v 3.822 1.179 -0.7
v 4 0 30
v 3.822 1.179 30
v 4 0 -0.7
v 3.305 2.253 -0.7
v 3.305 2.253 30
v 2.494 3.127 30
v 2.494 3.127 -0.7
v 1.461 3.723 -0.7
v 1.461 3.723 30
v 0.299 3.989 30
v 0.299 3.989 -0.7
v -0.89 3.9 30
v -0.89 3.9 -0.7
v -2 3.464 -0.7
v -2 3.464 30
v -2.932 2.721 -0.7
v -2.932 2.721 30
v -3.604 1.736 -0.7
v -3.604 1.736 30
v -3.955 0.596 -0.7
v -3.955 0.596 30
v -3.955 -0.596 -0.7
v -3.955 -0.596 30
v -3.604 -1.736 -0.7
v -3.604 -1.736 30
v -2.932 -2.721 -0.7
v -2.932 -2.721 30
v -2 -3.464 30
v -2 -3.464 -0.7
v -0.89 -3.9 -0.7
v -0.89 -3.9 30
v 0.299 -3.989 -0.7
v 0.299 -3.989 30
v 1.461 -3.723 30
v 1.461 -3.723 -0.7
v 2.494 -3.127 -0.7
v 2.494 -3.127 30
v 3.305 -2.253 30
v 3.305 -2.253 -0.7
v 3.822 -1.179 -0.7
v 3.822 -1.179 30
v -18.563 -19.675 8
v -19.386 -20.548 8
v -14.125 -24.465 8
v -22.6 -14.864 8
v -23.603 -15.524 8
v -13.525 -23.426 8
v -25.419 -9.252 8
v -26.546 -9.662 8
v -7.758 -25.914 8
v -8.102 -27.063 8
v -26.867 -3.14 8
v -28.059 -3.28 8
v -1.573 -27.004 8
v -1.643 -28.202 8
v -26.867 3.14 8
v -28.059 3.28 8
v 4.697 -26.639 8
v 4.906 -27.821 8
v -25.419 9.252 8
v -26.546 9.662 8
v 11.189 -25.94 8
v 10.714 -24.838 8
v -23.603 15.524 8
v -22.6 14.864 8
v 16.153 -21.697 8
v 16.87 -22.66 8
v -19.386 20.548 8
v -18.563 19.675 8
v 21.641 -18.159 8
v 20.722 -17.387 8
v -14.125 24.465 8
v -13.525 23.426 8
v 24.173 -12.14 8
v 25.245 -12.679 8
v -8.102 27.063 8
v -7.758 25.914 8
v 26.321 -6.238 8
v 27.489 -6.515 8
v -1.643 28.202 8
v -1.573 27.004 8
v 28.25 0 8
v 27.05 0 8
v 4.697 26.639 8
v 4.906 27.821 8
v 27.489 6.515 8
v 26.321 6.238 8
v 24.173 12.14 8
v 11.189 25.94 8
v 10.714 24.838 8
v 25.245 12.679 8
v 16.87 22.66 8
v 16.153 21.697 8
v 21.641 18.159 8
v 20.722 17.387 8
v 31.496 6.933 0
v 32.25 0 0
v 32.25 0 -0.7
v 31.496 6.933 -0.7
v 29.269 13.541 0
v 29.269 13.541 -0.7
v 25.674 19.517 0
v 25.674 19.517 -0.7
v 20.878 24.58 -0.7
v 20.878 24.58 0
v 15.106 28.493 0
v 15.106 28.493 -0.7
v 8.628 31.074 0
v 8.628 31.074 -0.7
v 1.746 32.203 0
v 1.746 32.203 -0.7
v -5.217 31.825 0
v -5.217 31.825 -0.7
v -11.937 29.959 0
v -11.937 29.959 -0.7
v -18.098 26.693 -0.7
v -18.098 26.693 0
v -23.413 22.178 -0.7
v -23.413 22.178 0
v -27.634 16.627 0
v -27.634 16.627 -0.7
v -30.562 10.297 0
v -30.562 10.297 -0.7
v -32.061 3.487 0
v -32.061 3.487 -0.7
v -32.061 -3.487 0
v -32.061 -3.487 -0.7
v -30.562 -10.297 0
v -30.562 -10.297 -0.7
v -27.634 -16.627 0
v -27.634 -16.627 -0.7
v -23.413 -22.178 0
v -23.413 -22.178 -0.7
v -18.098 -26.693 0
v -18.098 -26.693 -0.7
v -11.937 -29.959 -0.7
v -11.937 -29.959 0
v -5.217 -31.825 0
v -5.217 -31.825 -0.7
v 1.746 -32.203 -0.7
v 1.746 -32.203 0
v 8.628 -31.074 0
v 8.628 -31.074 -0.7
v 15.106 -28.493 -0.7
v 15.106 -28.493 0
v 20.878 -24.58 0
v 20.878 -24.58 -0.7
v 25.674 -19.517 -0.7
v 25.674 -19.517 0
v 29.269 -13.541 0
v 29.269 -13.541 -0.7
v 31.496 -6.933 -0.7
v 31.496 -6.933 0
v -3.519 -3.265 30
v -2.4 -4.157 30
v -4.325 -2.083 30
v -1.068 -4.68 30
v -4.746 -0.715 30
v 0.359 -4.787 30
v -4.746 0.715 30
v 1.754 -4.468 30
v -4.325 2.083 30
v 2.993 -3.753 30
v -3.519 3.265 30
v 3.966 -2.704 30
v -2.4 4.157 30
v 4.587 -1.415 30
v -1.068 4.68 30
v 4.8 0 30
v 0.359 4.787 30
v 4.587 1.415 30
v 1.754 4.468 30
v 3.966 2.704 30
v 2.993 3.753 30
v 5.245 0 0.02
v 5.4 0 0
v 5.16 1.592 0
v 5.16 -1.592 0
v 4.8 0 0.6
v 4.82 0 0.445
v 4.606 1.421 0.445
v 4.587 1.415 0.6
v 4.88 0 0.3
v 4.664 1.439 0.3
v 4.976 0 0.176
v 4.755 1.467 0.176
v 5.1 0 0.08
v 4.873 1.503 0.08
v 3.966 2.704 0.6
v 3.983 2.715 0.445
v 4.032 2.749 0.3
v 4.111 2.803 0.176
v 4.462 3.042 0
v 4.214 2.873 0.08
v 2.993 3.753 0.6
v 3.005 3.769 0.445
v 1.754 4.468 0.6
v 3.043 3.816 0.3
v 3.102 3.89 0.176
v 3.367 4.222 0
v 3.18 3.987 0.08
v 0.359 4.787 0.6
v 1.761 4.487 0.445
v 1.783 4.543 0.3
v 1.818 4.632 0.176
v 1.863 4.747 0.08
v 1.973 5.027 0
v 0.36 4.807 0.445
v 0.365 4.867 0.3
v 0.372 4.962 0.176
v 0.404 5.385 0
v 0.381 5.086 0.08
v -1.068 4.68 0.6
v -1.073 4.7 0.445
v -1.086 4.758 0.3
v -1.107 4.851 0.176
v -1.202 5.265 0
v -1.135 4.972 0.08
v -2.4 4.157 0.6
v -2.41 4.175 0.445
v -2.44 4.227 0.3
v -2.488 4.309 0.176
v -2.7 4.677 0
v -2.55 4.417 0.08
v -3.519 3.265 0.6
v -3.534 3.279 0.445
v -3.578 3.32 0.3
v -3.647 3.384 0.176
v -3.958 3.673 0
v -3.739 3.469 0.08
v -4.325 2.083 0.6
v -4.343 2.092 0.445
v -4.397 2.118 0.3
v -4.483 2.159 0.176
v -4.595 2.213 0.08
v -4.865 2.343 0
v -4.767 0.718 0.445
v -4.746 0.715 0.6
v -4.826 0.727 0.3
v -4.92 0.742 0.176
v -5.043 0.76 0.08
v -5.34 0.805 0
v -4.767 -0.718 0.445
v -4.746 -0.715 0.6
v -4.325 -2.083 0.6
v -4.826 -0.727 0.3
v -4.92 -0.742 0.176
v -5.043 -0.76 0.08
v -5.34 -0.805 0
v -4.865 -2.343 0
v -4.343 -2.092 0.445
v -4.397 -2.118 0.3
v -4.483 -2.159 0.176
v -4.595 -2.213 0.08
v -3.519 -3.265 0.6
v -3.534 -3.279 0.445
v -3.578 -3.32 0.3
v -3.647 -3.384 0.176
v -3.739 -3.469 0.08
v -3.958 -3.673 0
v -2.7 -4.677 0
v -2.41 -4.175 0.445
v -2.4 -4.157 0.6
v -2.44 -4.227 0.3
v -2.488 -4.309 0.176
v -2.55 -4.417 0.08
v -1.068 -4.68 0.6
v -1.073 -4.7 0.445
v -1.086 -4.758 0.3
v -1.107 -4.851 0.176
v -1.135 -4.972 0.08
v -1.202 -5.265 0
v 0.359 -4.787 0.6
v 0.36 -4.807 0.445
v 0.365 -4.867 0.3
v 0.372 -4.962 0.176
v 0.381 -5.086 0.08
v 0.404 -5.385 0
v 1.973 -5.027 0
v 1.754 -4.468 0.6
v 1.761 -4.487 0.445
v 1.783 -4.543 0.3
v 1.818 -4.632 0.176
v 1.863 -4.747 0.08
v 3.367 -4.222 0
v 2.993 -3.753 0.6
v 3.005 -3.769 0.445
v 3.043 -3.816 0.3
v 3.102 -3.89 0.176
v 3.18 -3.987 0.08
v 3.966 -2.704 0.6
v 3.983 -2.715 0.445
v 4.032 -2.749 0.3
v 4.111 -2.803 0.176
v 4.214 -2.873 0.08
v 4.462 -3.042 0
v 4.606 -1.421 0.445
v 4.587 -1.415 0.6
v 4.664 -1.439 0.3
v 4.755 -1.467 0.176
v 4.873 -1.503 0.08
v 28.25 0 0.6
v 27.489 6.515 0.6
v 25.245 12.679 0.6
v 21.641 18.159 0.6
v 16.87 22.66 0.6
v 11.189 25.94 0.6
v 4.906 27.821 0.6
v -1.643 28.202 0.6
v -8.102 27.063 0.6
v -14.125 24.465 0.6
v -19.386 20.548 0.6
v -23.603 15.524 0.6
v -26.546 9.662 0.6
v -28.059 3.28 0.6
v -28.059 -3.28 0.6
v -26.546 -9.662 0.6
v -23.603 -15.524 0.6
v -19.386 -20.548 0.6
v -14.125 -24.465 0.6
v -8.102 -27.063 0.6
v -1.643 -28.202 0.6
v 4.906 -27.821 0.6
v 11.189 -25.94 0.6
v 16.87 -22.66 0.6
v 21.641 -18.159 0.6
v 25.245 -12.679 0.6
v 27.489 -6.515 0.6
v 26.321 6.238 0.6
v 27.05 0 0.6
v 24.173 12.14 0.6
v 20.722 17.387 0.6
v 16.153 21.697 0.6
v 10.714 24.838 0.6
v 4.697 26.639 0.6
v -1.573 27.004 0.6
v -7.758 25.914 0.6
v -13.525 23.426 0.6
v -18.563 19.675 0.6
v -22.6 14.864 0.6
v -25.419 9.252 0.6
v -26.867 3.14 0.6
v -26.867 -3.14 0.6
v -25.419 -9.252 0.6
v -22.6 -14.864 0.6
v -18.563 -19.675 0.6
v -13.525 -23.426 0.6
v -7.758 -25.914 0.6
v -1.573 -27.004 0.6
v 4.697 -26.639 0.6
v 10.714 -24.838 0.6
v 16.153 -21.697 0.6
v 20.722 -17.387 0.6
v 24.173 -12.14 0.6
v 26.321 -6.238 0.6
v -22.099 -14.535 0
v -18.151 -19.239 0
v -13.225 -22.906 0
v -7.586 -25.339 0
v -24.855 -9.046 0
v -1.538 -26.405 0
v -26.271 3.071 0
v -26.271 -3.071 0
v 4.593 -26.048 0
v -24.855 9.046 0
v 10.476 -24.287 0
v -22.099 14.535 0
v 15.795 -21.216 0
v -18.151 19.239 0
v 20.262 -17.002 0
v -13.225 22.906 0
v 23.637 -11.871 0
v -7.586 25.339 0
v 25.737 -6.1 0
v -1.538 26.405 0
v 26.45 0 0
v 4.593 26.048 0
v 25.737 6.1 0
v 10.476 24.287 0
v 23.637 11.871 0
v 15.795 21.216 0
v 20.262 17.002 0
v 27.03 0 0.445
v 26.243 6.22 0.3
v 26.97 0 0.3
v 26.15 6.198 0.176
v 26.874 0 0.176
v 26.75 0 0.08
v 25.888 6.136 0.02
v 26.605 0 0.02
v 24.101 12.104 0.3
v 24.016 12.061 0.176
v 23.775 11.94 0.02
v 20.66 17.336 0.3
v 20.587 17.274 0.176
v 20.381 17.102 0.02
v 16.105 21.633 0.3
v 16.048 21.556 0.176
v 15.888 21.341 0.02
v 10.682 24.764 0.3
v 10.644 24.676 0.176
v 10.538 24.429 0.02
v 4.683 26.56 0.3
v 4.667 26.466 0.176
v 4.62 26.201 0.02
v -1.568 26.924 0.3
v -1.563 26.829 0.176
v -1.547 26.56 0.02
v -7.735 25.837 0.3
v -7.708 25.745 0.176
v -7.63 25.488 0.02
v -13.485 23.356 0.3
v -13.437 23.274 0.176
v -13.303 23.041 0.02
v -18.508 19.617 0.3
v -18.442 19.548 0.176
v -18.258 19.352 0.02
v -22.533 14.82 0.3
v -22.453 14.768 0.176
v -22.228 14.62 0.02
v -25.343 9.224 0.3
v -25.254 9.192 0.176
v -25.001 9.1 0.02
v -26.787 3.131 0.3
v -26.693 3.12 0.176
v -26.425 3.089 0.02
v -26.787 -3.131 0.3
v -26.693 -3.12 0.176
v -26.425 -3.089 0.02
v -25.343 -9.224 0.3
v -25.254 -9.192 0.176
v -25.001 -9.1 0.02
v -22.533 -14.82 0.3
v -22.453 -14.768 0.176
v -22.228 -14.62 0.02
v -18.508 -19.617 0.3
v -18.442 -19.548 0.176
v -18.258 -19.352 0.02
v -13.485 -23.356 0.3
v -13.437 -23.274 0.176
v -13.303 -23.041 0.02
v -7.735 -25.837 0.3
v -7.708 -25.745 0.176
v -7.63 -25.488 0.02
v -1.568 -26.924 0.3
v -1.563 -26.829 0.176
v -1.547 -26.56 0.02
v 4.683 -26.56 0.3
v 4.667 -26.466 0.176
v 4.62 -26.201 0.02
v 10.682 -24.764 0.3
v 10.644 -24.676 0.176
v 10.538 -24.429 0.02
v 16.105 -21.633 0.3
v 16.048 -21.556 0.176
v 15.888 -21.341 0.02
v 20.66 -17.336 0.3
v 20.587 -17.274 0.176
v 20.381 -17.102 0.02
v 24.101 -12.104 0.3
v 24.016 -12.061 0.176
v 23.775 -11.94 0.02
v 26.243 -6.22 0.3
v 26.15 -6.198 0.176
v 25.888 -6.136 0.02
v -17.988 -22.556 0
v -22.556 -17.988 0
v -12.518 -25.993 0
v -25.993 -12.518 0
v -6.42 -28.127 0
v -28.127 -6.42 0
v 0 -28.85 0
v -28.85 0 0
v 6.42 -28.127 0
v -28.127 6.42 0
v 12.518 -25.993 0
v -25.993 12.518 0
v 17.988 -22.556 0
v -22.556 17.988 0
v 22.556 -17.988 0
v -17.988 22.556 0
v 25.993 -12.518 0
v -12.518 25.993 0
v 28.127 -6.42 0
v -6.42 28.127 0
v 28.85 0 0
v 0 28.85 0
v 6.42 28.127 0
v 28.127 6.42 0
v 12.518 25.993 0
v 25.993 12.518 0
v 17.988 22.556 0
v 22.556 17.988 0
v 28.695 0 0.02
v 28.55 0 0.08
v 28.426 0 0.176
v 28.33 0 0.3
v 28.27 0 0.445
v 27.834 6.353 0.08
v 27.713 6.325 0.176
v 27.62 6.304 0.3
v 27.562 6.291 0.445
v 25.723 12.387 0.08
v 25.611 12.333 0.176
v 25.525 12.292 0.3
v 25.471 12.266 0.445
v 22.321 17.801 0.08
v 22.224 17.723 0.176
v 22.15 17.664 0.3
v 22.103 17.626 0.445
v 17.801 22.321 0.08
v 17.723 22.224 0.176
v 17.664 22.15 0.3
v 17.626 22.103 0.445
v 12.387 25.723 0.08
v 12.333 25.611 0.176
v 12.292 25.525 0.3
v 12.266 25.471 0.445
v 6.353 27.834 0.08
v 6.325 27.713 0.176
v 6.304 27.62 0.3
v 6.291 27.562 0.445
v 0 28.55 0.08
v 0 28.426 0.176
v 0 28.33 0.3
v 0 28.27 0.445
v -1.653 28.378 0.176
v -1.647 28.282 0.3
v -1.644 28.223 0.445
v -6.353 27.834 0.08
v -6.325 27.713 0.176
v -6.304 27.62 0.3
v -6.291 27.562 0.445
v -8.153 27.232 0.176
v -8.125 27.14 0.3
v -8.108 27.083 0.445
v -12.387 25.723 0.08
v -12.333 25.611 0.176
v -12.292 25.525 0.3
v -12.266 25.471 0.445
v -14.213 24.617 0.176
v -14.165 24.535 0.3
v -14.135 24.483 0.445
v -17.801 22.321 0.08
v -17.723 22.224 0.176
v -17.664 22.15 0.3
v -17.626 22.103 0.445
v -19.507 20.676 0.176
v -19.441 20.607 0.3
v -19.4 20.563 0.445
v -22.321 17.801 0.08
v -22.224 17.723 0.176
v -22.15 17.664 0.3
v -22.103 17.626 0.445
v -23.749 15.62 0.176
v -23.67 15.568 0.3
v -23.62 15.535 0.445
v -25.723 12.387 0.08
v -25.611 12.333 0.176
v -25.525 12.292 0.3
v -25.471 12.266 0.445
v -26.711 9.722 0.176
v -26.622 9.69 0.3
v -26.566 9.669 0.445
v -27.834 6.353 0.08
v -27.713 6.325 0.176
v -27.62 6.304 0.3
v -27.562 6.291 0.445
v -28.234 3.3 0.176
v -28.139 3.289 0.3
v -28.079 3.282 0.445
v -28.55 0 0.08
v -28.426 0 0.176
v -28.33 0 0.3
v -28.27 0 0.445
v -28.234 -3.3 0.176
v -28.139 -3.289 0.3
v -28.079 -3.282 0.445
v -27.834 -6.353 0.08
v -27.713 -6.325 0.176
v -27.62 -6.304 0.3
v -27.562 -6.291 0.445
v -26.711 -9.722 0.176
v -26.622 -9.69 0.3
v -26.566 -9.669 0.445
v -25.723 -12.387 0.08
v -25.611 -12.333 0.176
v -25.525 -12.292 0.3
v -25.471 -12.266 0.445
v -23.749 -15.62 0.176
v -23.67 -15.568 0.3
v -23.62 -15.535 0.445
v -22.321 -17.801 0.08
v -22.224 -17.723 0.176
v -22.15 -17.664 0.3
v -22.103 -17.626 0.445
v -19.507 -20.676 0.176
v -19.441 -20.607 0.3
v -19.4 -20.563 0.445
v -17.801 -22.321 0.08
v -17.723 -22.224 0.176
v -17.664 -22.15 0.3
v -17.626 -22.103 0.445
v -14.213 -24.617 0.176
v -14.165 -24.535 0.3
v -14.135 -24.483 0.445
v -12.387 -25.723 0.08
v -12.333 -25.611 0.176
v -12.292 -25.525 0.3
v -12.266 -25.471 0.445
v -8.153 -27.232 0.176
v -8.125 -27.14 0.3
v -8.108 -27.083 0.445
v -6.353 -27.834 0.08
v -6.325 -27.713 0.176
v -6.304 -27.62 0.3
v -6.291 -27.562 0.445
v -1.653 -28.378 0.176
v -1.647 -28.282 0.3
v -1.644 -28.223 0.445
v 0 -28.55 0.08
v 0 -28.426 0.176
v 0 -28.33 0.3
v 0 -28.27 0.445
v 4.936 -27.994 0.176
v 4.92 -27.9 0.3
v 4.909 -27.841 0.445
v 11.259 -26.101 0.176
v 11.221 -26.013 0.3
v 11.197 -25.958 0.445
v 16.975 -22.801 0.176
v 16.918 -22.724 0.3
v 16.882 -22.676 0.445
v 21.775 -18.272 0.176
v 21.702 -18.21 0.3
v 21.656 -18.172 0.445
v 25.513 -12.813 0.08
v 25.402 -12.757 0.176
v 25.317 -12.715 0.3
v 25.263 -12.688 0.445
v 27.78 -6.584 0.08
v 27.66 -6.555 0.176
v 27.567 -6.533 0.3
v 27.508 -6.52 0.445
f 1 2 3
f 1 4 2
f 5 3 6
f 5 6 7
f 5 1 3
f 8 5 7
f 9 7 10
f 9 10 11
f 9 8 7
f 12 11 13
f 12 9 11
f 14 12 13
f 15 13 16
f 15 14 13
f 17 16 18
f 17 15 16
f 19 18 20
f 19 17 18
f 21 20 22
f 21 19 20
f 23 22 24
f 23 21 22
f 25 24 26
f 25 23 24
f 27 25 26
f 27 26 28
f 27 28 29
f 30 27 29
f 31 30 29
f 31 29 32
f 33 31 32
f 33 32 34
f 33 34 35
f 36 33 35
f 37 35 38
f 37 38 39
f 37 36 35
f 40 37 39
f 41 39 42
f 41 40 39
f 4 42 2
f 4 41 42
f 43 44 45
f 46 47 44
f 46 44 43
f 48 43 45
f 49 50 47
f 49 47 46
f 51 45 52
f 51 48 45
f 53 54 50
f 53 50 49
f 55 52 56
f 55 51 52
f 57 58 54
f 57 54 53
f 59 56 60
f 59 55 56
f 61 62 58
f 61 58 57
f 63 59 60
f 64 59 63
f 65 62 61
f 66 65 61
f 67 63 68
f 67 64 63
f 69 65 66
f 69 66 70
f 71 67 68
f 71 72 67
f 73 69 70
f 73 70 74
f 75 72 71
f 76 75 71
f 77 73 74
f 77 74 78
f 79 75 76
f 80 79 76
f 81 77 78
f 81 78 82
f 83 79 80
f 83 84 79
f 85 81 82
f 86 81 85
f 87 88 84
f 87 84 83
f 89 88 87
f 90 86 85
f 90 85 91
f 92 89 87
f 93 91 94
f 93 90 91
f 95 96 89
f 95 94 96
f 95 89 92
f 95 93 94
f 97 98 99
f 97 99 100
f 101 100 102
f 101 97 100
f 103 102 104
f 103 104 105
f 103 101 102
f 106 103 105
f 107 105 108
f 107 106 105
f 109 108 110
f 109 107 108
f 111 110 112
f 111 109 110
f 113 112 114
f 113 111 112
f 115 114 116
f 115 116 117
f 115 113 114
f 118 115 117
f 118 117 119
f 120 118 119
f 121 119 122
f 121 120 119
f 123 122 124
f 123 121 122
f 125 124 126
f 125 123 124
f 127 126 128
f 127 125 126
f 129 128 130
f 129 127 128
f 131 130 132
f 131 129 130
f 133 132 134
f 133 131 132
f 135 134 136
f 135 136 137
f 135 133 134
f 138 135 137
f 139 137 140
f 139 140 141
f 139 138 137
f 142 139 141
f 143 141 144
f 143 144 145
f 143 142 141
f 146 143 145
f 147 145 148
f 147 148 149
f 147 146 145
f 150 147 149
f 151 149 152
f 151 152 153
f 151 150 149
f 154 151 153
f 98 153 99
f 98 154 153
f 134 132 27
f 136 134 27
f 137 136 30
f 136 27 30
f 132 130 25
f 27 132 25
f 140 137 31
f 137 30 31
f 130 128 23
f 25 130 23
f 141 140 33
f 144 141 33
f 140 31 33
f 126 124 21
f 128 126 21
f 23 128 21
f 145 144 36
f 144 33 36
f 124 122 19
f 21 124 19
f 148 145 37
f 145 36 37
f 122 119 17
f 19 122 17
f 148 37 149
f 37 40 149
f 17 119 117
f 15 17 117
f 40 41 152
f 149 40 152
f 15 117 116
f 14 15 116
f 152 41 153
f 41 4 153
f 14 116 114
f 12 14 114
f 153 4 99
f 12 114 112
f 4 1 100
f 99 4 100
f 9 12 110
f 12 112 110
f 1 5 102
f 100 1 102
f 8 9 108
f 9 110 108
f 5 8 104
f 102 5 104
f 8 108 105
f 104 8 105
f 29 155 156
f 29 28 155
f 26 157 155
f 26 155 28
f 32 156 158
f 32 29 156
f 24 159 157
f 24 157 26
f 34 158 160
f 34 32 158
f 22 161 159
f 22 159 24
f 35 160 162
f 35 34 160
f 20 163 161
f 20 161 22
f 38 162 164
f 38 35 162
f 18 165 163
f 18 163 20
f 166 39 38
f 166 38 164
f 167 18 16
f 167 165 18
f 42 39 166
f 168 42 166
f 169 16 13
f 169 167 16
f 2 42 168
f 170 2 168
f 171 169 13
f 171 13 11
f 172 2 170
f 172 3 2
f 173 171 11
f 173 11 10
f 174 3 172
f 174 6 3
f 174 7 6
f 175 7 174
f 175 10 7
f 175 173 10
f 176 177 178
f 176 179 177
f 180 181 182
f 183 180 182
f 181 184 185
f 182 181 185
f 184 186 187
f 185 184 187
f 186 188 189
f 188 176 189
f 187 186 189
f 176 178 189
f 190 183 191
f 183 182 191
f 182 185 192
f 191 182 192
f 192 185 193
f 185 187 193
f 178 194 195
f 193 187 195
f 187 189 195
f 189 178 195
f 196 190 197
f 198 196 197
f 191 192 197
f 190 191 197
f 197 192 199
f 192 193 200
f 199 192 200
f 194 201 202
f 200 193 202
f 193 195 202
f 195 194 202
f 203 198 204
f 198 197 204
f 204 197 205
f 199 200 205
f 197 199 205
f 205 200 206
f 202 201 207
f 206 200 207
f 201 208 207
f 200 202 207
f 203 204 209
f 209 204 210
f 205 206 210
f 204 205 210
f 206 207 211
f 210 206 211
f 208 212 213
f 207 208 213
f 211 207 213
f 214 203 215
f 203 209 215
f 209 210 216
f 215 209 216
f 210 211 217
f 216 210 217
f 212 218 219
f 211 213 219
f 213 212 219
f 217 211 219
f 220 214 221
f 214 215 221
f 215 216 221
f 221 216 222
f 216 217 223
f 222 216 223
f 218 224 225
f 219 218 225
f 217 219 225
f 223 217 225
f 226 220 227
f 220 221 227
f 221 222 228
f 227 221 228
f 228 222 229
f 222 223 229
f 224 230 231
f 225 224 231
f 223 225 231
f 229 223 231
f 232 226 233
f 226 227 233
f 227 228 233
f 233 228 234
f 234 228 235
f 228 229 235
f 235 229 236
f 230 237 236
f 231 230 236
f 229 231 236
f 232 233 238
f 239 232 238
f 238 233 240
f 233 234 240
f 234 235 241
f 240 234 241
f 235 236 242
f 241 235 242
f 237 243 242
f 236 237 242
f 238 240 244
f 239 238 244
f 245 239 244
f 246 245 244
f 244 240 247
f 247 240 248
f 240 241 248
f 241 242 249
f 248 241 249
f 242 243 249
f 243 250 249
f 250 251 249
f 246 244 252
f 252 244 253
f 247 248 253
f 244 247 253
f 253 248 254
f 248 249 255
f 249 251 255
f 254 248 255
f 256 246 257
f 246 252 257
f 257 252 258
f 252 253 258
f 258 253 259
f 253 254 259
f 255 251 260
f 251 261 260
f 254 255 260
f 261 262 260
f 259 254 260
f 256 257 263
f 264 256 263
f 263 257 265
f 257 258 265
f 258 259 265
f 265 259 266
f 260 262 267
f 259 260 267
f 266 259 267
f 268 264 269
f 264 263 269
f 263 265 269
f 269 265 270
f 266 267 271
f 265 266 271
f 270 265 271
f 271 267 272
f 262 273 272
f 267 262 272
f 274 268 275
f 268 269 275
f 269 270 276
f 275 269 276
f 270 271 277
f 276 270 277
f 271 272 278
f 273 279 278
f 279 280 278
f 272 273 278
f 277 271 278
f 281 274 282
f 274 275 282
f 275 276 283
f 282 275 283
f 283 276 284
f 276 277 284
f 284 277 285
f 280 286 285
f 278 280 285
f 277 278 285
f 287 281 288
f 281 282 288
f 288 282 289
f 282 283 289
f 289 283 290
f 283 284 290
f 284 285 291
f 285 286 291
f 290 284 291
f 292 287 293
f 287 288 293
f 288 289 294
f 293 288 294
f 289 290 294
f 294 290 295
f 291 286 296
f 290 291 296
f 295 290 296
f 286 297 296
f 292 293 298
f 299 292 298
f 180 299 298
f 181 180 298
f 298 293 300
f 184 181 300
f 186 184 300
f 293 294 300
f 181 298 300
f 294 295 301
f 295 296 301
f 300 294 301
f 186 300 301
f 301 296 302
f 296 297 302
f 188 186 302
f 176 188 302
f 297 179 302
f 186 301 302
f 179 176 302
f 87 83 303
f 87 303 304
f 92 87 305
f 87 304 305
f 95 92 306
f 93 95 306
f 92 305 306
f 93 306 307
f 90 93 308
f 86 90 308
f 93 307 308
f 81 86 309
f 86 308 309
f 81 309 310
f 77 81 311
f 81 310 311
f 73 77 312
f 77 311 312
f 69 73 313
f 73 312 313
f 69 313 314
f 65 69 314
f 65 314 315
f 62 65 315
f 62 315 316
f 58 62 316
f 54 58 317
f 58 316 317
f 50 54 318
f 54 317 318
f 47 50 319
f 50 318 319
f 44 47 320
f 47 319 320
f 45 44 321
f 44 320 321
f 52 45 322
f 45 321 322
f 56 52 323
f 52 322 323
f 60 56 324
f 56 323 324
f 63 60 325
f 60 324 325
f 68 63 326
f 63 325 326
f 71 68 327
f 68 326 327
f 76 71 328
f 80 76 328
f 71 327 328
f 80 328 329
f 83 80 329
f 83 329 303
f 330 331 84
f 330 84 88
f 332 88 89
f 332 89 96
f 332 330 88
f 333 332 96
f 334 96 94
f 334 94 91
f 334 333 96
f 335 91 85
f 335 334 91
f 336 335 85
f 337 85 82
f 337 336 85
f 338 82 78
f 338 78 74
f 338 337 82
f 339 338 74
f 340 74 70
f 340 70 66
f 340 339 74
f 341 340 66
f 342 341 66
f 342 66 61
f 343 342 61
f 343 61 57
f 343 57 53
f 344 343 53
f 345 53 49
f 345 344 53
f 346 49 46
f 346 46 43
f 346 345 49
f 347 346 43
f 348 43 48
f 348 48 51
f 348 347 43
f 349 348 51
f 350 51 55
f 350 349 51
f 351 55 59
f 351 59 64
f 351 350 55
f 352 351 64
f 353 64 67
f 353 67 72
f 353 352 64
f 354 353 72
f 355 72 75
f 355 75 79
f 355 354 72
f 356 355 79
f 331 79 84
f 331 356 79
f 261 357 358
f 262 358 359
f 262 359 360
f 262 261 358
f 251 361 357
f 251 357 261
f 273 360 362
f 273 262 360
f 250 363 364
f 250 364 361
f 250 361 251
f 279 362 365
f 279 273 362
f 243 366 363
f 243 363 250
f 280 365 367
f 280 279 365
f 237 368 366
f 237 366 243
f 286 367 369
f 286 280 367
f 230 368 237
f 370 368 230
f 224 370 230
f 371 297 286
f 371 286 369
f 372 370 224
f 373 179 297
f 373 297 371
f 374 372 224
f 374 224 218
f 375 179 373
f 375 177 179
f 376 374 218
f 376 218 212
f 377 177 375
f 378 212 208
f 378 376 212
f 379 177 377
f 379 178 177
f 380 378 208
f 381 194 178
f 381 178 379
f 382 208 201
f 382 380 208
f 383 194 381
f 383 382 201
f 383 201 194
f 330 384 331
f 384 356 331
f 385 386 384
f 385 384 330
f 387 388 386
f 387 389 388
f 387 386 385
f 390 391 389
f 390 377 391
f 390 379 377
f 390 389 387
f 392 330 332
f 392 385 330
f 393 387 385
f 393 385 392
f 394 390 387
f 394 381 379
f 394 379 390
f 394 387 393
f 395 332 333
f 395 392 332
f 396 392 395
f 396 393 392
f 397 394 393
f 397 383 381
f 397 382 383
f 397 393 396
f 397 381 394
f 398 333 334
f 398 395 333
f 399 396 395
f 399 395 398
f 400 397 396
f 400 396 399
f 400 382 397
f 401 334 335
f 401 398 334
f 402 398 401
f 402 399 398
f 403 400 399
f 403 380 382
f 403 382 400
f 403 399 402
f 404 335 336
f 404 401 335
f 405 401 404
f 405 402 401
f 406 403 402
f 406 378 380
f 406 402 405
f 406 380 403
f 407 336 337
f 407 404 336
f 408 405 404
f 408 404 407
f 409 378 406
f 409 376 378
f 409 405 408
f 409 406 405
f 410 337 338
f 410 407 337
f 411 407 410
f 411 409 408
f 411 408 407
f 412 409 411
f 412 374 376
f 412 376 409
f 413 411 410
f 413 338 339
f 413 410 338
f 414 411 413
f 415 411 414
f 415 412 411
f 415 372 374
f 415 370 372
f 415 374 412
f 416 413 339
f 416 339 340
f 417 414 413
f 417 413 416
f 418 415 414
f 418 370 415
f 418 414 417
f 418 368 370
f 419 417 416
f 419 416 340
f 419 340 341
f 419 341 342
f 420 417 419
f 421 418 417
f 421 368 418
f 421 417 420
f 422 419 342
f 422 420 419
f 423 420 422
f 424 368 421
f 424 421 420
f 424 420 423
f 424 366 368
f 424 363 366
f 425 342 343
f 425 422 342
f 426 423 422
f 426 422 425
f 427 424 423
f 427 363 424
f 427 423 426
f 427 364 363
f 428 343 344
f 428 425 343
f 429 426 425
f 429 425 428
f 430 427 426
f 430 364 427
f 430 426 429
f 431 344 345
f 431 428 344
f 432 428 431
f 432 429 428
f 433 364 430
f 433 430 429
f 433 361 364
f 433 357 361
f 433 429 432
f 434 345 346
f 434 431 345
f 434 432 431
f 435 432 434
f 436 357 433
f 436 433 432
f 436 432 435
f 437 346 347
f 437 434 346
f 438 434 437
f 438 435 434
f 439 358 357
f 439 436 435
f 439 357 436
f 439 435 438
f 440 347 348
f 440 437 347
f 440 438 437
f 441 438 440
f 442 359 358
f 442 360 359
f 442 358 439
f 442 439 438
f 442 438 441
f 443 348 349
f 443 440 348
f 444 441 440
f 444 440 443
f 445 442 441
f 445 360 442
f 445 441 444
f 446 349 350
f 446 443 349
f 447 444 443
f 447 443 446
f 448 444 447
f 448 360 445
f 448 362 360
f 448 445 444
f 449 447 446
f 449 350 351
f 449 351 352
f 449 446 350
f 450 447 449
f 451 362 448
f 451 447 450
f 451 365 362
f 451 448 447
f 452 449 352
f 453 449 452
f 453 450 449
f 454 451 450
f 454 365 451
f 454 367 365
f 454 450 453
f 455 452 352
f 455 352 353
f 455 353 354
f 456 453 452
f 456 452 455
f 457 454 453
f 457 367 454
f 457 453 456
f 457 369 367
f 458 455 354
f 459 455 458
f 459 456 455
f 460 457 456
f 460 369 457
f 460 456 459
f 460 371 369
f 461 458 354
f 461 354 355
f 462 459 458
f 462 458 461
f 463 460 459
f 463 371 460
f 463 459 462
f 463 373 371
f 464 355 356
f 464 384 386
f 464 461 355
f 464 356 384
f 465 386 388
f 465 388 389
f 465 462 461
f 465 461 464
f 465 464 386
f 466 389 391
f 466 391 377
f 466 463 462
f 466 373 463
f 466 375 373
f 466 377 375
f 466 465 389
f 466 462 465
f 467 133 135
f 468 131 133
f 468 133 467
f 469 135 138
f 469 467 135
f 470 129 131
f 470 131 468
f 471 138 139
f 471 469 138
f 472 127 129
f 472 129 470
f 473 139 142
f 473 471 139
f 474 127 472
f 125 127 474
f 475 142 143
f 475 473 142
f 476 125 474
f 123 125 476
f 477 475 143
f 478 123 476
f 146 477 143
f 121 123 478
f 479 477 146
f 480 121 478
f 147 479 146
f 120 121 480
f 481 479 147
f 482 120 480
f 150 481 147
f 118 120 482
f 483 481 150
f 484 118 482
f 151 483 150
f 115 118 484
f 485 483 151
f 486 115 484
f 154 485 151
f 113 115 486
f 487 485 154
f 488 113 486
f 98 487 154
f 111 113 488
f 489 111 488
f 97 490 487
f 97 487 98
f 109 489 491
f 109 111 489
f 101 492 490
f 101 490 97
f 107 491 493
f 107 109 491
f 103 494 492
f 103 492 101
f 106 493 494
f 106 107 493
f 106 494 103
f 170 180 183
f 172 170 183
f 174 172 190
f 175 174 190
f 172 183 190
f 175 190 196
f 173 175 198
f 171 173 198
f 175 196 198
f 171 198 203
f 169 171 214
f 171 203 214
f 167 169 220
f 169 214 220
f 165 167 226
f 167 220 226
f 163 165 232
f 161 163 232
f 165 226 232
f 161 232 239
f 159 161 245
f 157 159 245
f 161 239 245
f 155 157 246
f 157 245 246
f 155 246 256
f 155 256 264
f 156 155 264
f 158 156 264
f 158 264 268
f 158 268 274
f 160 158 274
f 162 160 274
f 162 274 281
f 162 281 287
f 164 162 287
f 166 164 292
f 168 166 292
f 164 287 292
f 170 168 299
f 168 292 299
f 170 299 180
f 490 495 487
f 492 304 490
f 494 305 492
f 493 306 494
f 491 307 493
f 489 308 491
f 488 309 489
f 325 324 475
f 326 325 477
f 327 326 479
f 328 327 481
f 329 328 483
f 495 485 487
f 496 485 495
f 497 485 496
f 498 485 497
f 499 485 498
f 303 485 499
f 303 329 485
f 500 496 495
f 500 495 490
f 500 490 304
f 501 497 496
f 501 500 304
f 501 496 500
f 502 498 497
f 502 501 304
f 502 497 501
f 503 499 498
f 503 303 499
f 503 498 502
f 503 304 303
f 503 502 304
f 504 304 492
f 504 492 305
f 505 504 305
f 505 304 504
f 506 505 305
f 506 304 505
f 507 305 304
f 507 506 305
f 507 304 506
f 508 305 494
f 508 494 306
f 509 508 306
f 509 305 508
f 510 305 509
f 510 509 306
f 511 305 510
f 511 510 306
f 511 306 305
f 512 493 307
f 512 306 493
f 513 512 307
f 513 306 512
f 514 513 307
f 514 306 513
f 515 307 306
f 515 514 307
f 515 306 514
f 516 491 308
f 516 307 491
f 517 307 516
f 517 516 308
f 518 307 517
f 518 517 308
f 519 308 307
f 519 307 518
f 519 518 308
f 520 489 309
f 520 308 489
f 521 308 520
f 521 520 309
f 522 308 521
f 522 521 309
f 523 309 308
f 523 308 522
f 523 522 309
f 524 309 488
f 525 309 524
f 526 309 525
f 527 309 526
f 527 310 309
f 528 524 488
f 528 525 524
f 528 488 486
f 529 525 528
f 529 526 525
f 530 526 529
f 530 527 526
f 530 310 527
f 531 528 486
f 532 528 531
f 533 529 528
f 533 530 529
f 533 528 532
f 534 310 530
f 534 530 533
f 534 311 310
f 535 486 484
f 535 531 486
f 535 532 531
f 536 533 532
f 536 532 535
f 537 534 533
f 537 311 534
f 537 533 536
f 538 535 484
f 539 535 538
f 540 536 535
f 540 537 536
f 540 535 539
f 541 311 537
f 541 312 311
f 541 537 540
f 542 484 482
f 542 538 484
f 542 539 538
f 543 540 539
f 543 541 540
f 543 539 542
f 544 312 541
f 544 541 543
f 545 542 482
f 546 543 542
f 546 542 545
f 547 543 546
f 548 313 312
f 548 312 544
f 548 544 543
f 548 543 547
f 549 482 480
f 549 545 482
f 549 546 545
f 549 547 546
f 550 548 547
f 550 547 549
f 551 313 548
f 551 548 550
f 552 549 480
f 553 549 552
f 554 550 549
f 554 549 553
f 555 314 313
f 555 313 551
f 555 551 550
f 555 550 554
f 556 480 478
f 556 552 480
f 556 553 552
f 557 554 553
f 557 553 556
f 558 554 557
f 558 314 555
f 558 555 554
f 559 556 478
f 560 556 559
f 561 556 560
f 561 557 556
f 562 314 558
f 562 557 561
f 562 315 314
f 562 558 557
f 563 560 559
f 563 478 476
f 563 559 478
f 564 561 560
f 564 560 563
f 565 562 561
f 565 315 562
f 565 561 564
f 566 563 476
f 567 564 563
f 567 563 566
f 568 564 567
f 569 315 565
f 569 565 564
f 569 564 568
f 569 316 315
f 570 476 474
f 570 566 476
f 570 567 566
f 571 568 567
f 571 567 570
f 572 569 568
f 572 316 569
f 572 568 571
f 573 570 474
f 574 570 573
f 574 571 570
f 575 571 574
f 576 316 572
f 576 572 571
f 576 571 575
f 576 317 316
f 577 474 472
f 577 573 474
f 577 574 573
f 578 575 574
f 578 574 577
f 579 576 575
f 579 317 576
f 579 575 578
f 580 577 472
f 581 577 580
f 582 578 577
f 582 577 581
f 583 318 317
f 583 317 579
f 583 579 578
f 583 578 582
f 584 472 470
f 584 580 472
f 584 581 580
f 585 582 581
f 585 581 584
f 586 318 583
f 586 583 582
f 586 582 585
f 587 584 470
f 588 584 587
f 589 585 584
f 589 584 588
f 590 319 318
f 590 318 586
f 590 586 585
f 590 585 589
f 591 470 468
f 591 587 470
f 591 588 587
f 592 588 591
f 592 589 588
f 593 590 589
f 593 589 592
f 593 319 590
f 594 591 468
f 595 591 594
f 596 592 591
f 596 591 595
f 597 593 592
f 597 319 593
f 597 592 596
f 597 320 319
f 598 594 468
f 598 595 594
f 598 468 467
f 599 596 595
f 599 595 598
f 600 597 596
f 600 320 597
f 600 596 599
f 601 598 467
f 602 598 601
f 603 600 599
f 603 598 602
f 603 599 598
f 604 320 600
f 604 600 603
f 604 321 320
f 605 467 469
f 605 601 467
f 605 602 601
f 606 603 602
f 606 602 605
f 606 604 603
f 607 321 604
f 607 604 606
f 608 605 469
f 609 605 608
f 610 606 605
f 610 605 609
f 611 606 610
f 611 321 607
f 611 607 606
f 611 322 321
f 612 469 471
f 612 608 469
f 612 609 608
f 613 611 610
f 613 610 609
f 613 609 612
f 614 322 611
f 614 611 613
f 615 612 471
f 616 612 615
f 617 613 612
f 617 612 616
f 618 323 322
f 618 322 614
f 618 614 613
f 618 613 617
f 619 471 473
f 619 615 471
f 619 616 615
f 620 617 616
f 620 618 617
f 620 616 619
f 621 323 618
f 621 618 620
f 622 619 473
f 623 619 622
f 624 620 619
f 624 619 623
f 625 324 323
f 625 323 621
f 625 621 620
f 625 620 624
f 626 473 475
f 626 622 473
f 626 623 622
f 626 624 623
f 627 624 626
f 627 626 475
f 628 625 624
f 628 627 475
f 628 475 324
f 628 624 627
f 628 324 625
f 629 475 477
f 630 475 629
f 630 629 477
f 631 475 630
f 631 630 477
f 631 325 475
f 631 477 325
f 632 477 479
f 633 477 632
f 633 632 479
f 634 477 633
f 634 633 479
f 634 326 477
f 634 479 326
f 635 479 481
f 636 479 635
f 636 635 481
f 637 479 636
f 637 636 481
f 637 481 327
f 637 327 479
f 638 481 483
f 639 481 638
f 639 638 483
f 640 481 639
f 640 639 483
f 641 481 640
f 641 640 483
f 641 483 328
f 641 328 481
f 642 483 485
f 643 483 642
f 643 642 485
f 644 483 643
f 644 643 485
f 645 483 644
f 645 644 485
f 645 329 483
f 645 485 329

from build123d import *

# Parameters (mm, degrees)
F0_R     = 28.25
F0_R_2   = 27.05
F1_DEPTH = 8
F0_R_3   = 32.25
F0_R_4   = 4.8
F0_R_5   = 4
F2_DEPTH = 0.7
F3_DEPTH = 30
F4_R     = 0.6


with BuildPart() as f1:
    # F0 (on Top) → F1 (new body)
    with BuildSketch(Plane.XY):
        Circle(F0_R)
        Circle(F0_R_2, mode=Mode.SUBTRACT)
    extrude(amount=F1_DEPTH)

    # F0 (on Top) → F2 (join)
    with BuildSketch(Plane.XY):
        Circle(F0_R_3)
        Circle(F0_R, mode=Mode.SUBTRACT)
        Circle(F0_R)
        Circle(F0_R_2, mode=Mode.SUBTRACT)
        Circle(F0_R_2)
        Circle(F0_R_4, mode=Mode.SUBTRACT)
        Circle(F0_R_4)
        Circle(F0_R_5, mode=Mode.SUBTRACT)
    extrude(amount=-F2_DEPTH)

    # F0 (on Top) → F3 (join)
    with BuildSketch(Plane.XY):
        Circle(F0_R_4)
        Circle(F0_R_5, mode=Mode.SUBTRACT)
    extrude(amount=F3_DEPTH)

    # F4
    f4_edges = [f1.edges().sort_by_distance(p)[0] for p in [
        (-28.25, 0, 0),
        (-27.05, 0, 0),
        (-4.8, 0, 0),
    ]]
    fillet(f4_edges, radius=F4_R)


solid = f1.part
